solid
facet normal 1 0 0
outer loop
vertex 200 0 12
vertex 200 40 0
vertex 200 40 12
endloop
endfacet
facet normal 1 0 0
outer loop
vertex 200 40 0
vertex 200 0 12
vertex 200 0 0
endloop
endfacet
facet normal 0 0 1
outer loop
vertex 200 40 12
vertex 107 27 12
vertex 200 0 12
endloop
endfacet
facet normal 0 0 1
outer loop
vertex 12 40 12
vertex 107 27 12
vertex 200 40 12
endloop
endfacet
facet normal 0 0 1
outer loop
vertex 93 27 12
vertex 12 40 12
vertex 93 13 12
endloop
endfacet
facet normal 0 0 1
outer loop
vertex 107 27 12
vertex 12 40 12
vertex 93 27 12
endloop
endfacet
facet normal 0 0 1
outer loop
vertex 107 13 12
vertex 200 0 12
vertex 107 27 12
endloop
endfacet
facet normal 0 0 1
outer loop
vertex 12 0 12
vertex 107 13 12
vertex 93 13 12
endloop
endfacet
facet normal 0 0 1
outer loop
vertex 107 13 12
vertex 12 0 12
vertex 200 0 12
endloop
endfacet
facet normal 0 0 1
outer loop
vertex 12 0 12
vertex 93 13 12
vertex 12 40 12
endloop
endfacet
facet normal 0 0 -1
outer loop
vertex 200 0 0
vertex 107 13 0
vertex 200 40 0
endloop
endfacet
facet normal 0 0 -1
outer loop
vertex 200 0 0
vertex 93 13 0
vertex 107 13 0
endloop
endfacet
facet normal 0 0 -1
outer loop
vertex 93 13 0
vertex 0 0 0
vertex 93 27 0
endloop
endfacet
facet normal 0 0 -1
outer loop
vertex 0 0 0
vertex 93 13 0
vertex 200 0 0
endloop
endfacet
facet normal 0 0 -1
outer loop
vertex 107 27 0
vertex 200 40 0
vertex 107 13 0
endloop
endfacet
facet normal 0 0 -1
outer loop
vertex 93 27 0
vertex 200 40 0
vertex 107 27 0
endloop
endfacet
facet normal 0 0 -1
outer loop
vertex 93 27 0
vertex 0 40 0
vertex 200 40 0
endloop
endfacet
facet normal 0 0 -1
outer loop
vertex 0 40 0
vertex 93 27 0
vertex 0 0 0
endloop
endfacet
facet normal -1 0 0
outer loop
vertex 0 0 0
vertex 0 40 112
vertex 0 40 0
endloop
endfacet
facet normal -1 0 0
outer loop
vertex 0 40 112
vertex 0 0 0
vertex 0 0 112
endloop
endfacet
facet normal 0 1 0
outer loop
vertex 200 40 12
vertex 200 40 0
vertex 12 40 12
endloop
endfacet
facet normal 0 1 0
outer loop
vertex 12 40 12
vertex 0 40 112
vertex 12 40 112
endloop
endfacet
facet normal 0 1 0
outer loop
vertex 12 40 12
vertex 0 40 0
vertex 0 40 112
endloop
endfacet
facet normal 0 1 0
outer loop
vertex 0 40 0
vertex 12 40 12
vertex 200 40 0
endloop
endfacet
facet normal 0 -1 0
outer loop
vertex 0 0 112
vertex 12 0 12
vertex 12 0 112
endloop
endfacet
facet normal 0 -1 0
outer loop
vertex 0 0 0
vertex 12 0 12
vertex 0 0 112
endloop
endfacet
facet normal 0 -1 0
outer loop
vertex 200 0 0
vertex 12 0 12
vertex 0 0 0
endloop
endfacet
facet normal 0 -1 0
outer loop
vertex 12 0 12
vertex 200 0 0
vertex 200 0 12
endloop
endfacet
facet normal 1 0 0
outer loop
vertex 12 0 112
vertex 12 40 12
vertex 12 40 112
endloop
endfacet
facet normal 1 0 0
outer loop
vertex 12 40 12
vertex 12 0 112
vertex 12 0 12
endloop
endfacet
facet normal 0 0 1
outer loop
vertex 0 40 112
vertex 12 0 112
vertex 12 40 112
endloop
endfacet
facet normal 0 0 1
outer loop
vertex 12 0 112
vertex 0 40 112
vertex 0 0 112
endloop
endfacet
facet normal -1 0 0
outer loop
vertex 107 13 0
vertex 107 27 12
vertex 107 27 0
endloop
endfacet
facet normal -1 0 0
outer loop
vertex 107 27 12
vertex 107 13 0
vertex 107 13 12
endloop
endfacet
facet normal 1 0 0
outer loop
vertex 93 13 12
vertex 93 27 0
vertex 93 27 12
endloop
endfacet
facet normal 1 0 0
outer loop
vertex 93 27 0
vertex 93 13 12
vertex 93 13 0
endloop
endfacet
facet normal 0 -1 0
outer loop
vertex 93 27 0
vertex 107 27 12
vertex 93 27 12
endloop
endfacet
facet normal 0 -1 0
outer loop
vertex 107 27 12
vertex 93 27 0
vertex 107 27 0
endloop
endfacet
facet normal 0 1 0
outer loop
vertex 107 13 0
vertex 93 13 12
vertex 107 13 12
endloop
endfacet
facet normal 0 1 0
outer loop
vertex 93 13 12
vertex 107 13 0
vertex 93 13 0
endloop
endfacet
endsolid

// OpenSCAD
$fn = 32;

// ----------------------------------------------------------------------
// Gantry bracket: 200-250 mm L bracket
// ----------------------------------------------------------------------

// --- parameters (mm) ---
base_l = 200;             // base arm length, X
arm_w = 40;               // arm width, Y
thick = 12;               // arm thickness
up_h = 100;               // vertical arm height, Z
slot_w = 14;              // adjustment slot width in the base
fit_tol = 0.05;           // tolerance for press fits, mm
free_tol = 0.3;           // tolerance for clearance fits, mm

total_h = up_h + thick;  // overall height

difference() {
  union() {
    cube([base_l, arm_w, thick]);
    cube([thick, arm_w, total_h]);
  }
  translate([base_l / 2 - slot_w / 2, arm_w / 2 - slot_w / 2, -1])
    cube([slot_w, slot_w, thick + 2]);
}
